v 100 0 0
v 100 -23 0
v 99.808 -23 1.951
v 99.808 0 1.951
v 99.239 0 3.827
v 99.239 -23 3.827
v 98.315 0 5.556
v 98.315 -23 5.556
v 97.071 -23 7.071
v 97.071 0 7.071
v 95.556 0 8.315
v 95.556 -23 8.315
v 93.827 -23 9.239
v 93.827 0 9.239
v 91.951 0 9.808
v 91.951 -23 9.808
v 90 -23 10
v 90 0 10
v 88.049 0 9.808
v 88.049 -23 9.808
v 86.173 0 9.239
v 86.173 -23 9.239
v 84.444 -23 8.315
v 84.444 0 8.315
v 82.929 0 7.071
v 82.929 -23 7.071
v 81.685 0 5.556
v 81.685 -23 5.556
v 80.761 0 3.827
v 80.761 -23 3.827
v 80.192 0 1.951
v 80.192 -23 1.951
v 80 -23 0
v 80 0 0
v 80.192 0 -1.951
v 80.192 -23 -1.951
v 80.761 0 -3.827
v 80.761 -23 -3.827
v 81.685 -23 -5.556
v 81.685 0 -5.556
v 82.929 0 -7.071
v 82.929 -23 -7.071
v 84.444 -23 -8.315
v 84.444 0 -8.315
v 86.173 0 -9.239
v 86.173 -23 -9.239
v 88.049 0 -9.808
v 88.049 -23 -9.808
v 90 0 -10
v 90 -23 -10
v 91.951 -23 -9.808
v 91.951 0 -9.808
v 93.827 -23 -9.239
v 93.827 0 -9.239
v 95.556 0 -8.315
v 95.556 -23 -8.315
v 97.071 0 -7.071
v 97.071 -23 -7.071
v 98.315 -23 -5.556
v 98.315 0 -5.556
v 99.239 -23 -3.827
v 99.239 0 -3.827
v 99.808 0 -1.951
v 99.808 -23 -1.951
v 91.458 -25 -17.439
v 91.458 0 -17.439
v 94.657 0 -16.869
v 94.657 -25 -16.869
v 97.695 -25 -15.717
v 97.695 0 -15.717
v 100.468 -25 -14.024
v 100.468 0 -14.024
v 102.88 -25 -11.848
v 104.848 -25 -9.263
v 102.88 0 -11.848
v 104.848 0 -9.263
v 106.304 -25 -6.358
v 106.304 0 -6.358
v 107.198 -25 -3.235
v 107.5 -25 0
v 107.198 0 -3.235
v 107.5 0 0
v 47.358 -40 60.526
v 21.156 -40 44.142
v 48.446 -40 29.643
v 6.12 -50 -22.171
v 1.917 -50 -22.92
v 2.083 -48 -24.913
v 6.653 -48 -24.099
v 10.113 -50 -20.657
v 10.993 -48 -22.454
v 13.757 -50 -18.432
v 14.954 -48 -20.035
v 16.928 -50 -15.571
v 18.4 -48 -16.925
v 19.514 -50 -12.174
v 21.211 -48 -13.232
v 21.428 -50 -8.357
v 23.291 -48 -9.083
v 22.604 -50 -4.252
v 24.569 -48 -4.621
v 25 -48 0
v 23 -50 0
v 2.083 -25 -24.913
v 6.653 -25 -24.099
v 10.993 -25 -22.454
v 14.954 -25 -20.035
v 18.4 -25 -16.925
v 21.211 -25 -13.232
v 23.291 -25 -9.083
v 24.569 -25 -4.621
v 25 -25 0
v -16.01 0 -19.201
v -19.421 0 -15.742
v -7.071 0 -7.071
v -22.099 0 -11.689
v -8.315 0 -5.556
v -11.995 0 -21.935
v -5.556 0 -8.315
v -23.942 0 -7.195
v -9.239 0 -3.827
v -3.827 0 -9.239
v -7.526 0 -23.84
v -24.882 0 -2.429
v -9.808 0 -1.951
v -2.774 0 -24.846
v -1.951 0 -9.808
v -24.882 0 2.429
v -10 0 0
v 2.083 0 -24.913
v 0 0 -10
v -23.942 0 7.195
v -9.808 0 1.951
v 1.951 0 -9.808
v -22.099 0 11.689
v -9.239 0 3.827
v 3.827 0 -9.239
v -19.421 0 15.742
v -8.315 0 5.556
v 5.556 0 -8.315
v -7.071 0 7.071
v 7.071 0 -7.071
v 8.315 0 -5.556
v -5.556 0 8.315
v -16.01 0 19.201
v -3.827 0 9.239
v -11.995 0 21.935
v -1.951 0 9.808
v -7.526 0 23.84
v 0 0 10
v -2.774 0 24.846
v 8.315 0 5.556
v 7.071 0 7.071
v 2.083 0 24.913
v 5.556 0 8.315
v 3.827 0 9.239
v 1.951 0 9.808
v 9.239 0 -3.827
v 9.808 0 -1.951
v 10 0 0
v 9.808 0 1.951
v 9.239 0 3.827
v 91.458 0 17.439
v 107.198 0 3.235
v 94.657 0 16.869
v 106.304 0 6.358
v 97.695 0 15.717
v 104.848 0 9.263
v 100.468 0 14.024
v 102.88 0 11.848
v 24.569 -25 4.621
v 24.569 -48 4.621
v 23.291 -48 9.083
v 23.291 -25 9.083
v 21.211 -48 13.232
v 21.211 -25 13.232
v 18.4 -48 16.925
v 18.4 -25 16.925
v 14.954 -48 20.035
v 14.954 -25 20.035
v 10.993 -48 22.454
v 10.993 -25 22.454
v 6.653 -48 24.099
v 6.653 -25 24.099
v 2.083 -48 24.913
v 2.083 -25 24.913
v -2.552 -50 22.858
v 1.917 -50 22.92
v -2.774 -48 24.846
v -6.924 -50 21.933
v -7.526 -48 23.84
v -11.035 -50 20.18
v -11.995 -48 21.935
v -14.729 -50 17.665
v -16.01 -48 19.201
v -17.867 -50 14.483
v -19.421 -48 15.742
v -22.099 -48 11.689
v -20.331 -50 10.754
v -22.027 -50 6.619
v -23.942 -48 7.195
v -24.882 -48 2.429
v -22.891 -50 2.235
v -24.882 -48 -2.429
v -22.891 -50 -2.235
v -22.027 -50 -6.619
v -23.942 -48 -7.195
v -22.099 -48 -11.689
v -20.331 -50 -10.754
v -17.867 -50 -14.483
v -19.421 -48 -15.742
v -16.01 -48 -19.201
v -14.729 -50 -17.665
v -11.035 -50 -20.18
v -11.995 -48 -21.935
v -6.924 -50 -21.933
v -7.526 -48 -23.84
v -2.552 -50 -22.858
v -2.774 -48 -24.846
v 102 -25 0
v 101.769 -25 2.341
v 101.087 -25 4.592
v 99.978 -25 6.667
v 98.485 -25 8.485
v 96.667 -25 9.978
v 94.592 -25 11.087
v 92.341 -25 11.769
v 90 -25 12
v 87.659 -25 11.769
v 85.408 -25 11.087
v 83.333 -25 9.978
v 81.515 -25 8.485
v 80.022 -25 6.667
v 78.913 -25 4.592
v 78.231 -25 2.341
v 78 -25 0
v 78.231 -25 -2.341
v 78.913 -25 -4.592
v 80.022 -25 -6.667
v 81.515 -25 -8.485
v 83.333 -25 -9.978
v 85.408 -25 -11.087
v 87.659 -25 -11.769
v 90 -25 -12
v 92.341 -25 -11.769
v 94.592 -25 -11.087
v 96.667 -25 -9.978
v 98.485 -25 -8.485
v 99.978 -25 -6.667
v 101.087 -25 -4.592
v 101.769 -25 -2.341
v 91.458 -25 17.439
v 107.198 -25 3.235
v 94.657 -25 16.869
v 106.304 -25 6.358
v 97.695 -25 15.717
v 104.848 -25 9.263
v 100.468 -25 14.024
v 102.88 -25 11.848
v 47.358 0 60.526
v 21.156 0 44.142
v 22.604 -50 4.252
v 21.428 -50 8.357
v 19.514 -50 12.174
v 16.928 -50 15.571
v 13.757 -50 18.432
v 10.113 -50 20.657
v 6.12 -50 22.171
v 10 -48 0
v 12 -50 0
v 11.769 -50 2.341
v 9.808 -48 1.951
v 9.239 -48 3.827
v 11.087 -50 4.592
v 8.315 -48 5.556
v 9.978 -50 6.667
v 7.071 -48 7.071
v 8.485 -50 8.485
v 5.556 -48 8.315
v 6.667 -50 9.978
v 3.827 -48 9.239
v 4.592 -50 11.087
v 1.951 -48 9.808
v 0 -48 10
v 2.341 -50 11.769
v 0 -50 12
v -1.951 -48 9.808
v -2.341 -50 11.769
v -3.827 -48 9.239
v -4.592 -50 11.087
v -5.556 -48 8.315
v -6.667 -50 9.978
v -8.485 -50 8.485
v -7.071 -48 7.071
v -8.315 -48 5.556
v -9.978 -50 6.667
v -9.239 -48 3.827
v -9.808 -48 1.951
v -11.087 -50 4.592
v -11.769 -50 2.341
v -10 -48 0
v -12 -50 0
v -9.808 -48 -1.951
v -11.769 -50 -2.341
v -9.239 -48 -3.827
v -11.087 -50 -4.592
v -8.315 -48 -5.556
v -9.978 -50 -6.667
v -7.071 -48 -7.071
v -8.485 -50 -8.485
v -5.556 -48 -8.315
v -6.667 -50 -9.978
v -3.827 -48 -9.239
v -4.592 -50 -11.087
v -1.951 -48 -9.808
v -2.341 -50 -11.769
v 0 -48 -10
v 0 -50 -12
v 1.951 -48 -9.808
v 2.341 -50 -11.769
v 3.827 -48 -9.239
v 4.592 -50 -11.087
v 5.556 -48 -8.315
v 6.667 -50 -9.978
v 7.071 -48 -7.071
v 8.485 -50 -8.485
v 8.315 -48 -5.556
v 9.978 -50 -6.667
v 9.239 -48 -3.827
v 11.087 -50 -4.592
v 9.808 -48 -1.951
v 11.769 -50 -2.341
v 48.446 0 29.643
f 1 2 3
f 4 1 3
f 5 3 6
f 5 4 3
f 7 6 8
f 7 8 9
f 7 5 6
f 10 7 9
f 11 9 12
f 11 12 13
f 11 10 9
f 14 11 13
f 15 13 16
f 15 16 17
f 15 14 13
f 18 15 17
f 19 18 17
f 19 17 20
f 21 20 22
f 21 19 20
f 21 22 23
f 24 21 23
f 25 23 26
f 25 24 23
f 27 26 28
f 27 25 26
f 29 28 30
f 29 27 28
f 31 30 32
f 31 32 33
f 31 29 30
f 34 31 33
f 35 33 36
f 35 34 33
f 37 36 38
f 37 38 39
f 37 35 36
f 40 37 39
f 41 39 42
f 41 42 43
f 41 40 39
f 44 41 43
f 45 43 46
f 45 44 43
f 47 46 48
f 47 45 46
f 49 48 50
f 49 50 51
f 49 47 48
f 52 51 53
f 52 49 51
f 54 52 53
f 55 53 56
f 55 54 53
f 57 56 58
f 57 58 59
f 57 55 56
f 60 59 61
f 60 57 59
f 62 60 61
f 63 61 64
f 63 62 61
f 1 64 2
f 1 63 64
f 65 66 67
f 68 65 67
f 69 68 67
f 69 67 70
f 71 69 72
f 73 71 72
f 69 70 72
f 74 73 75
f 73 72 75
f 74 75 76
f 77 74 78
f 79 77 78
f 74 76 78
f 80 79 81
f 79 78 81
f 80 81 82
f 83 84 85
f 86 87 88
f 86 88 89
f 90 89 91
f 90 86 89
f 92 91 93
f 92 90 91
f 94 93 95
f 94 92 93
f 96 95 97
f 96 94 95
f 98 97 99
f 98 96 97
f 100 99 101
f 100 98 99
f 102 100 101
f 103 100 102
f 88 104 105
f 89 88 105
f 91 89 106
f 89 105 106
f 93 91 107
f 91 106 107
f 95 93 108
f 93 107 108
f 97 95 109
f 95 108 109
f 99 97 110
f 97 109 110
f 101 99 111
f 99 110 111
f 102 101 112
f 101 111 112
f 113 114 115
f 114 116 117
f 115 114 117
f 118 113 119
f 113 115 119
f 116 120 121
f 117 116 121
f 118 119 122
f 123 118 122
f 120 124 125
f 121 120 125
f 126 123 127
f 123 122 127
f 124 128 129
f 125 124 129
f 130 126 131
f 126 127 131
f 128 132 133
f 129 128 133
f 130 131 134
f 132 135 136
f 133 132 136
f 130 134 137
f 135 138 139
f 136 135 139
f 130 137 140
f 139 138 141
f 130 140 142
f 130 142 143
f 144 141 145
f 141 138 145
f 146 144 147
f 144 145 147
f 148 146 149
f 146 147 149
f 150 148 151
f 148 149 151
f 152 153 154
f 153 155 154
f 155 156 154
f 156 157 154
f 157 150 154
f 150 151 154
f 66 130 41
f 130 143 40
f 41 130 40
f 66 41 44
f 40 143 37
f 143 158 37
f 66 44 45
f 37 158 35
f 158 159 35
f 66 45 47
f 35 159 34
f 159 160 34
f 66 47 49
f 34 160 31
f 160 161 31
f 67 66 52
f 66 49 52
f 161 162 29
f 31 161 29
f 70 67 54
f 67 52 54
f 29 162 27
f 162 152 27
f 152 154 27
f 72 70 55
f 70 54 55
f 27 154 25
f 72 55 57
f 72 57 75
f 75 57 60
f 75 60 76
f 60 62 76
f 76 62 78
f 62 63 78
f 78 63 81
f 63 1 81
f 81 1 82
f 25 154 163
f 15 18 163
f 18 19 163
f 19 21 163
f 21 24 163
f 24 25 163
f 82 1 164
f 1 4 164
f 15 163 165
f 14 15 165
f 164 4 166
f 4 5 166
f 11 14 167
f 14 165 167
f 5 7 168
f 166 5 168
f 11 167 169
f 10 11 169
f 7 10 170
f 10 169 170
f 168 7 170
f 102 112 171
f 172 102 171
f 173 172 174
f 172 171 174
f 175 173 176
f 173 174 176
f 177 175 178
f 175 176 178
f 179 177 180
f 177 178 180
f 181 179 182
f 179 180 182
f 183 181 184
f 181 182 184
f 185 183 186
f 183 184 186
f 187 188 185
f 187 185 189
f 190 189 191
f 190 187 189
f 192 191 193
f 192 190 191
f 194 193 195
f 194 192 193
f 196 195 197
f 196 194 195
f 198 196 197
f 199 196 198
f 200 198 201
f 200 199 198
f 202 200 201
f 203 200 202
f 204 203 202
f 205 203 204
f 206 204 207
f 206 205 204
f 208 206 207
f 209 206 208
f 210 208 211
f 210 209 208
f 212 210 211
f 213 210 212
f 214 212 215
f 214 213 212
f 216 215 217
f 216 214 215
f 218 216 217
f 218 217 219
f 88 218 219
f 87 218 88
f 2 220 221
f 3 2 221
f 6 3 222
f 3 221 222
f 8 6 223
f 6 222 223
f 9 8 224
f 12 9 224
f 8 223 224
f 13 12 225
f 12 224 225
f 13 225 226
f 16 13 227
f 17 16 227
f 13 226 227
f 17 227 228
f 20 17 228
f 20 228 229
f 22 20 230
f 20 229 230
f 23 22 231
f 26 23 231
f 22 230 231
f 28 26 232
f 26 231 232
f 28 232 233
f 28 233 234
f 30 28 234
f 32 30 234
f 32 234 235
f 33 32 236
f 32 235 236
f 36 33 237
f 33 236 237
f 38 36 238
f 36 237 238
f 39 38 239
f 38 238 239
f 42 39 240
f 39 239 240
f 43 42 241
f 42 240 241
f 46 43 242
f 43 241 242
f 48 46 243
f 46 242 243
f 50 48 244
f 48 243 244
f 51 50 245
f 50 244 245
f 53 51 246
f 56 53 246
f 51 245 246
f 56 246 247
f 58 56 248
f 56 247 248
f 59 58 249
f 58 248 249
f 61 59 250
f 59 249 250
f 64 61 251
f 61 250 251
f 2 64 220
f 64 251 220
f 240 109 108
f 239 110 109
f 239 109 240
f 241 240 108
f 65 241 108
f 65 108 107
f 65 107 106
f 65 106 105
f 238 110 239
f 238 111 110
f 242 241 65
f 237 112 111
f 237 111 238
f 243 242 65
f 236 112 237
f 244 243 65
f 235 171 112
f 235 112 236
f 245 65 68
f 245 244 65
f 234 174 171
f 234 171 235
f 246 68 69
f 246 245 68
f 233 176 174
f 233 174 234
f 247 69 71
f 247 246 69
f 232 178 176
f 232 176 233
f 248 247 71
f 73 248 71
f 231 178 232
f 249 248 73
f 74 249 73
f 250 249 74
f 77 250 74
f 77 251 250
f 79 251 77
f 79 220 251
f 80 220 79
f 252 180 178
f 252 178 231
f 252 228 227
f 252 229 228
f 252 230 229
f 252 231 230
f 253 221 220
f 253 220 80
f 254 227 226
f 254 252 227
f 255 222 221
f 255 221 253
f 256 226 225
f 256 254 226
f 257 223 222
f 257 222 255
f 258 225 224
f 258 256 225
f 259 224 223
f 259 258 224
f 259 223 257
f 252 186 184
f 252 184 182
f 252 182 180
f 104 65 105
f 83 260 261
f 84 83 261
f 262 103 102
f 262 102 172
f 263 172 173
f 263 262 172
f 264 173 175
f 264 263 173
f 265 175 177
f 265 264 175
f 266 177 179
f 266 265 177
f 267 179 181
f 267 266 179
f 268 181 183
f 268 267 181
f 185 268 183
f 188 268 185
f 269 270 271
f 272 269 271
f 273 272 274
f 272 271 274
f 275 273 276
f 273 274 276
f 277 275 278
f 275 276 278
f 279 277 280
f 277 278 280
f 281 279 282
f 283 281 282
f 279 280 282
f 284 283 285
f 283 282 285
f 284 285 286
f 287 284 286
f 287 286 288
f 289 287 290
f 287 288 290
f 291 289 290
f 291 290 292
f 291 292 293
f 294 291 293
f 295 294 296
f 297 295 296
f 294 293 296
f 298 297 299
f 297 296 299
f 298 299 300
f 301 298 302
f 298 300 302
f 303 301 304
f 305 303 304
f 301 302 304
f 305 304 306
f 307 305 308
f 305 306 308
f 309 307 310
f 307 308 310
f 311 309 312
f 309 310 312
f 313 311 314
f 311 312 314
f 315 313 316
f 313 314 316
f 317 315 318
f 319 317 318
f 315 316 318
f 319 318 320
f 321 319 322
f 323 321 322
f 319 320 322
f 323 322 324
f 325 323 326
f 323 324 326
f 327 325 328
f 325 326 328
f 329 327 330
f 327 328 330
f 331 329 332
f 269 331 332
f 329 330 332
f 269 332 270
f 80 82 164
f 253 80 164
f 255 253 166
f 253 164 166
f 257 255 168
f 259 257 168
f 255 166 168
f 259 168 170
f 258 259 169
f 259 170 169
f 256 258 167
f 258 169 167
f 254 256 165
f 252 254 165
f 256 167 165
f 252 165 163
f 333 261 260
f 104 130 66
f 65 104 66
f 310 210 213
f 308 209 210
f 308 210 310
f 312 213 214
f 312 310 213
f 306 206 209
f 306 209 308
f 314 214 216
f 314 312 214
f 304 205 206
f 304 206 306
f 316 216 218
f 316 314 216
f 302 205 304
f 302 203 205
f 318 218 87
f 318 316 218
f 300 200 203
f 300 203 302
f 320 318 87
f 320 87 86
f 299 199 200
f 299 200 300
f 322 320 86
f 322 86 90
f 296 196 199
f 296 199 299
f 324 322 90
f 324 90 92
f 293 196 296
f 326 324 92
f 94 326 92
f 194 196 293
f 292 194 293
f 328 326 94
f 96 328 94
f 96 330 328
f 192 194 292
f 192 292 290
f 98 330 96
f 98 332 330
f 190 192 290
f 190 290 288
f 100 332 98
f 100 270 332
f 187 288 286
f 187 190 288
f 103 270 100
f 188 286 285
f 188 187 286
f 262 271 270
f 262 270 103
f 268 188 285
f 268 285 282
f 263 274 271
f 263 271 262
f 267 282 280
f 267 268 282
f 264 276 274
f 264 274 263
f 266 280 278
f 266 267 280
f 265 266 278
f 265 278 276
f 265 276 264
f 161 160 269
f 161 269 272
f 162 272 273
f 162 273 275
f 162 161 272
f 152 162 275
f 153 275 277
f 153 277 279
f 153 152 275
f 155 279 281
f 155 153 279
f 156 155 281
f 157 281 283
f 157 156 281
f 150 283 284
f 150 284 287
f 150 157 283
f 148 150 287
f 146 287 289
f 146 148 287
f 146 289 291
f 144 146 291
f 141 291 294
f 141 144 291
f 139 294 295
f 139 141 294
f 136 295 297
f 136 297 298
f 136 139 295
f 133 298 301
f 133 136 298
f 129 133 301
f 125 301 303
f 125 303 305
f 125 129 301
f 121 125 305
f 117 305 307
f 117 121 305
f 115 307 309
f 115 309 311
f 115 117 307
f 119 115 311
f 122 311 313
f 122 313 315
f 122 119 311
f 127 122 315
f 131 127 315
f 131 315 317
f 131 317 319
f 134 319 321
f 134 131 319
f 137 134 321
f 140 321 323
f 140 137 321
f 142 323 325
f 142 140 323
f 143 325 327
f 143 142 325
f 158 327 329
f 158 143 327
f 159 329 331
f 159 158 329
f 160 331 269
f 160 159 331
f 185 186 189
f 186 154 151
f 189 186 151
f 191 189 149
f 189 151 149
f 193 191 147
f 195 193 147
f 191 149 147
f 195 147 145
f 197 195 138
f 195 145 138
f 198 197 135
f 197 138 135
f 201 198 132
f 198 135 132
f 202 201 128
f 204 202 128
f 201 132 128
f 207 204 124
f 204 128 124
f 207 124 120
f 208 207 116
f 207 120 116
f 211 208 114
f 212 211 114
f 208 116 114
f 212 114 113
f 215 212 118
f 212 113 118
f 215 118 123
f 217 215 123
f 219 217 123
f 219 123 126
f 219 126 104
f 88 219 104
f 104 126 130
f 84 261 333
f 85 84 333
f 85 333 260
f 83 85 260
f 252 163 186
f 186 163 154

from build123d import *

# Parameters (mm, degrees)
F0_R     = 10
F1_DEPTH = 25
F2_DEPTH = 50
F3_SIZE  = 2
F5_DEPTH = 40


with BuildPart() as f1:
    # F0 (on Front) → F1 (new body)
    with BuildSketch(Plane.XZ):
        with BuildLine():
            ThreePointArc((2.083333, -24.913043), (18.399502, -16.92508), (25, 0))
            ThreePointArc((25, 0), (18.399502, 16.92508), (2.083333, 24.913043))
            ThreePointArc((2.083333, 24.913043), (-25, 0), (2.083333, -24.913043))
        make_face()
        Circle(F0_R, mode=Mode.SUBTRACT)
        with BuildLine():
            ThreePointArc((2.083333, 24.913043), (18.399502, 16.92508), (25, 0))
            ThreePointArc((25, 0), (18.399502, -16.92508), (2.083333, -24.913043))
            Line((2.083333, -24.913043), (91.458333, -17.43913))
            ThreePointArc((91.458333, -17.43913), (72.5, 0), (91.458333, 17.43913))
            Line((91.458333, 17.43913), (2.083333, 24.913043))
        make_face()
        with BuildLine():
            ThreePointArc((107.5, 0), (102.879651, 11.847556), (91.458333, 17.43913))
            ThreePointArc((91.458333, 17.43913), (72.5, 0), (91.458333, -17.43913))
            ThreePointArc((91.458333, -17.43913), (102.879651, -11.847556), (107.5, 0))
        make_face()
        with Locations((90, 0)):
            Circle(F0_R, mode=Mode.SUBTRACT)
    extrude(amount=F1_DEPTH)

    # F0 (on Front) → F2 (join)
    with BuildSketch(Plane.XZ):
        with BuildLine():
            ThreePointArc((2.083333, -24.913043), (18.399502, -16.92508), (25, 0))
            ThreePointArc((25, 0), (18.399502, 16.92508), (2.083333, 24.913043))
            ThreePointArc((2.083333, 24.913043), (-25, 0), (2.083333, -24.913043))
        make_face()
        Circle(F0_R, mode=Mode.SUBTRACT)
    extrude(amount=F2_DEPTH)

    # F3
    f3_edges = [f1.edges().sort_by_distance(p)[0] for p in [
        (-2.083333, -50, 24.913043),
        (-10, -50, 0),
        (80, -25, 0),
    ]]
    chamfer(f3_edges, length=F3_SIZE)


with BuildPart() as f5:
    # F4 (on Front) → F5 (new body)
    with BuildSketch(Plane.XZ):
        Polygon((21.156458, 44.141732), (48.445877, 29.642772), (47.357635, 60.525581), align=None)
    extrude(amount=F5_DEPTH)


solid = Compound([f1.part, f5.part])
